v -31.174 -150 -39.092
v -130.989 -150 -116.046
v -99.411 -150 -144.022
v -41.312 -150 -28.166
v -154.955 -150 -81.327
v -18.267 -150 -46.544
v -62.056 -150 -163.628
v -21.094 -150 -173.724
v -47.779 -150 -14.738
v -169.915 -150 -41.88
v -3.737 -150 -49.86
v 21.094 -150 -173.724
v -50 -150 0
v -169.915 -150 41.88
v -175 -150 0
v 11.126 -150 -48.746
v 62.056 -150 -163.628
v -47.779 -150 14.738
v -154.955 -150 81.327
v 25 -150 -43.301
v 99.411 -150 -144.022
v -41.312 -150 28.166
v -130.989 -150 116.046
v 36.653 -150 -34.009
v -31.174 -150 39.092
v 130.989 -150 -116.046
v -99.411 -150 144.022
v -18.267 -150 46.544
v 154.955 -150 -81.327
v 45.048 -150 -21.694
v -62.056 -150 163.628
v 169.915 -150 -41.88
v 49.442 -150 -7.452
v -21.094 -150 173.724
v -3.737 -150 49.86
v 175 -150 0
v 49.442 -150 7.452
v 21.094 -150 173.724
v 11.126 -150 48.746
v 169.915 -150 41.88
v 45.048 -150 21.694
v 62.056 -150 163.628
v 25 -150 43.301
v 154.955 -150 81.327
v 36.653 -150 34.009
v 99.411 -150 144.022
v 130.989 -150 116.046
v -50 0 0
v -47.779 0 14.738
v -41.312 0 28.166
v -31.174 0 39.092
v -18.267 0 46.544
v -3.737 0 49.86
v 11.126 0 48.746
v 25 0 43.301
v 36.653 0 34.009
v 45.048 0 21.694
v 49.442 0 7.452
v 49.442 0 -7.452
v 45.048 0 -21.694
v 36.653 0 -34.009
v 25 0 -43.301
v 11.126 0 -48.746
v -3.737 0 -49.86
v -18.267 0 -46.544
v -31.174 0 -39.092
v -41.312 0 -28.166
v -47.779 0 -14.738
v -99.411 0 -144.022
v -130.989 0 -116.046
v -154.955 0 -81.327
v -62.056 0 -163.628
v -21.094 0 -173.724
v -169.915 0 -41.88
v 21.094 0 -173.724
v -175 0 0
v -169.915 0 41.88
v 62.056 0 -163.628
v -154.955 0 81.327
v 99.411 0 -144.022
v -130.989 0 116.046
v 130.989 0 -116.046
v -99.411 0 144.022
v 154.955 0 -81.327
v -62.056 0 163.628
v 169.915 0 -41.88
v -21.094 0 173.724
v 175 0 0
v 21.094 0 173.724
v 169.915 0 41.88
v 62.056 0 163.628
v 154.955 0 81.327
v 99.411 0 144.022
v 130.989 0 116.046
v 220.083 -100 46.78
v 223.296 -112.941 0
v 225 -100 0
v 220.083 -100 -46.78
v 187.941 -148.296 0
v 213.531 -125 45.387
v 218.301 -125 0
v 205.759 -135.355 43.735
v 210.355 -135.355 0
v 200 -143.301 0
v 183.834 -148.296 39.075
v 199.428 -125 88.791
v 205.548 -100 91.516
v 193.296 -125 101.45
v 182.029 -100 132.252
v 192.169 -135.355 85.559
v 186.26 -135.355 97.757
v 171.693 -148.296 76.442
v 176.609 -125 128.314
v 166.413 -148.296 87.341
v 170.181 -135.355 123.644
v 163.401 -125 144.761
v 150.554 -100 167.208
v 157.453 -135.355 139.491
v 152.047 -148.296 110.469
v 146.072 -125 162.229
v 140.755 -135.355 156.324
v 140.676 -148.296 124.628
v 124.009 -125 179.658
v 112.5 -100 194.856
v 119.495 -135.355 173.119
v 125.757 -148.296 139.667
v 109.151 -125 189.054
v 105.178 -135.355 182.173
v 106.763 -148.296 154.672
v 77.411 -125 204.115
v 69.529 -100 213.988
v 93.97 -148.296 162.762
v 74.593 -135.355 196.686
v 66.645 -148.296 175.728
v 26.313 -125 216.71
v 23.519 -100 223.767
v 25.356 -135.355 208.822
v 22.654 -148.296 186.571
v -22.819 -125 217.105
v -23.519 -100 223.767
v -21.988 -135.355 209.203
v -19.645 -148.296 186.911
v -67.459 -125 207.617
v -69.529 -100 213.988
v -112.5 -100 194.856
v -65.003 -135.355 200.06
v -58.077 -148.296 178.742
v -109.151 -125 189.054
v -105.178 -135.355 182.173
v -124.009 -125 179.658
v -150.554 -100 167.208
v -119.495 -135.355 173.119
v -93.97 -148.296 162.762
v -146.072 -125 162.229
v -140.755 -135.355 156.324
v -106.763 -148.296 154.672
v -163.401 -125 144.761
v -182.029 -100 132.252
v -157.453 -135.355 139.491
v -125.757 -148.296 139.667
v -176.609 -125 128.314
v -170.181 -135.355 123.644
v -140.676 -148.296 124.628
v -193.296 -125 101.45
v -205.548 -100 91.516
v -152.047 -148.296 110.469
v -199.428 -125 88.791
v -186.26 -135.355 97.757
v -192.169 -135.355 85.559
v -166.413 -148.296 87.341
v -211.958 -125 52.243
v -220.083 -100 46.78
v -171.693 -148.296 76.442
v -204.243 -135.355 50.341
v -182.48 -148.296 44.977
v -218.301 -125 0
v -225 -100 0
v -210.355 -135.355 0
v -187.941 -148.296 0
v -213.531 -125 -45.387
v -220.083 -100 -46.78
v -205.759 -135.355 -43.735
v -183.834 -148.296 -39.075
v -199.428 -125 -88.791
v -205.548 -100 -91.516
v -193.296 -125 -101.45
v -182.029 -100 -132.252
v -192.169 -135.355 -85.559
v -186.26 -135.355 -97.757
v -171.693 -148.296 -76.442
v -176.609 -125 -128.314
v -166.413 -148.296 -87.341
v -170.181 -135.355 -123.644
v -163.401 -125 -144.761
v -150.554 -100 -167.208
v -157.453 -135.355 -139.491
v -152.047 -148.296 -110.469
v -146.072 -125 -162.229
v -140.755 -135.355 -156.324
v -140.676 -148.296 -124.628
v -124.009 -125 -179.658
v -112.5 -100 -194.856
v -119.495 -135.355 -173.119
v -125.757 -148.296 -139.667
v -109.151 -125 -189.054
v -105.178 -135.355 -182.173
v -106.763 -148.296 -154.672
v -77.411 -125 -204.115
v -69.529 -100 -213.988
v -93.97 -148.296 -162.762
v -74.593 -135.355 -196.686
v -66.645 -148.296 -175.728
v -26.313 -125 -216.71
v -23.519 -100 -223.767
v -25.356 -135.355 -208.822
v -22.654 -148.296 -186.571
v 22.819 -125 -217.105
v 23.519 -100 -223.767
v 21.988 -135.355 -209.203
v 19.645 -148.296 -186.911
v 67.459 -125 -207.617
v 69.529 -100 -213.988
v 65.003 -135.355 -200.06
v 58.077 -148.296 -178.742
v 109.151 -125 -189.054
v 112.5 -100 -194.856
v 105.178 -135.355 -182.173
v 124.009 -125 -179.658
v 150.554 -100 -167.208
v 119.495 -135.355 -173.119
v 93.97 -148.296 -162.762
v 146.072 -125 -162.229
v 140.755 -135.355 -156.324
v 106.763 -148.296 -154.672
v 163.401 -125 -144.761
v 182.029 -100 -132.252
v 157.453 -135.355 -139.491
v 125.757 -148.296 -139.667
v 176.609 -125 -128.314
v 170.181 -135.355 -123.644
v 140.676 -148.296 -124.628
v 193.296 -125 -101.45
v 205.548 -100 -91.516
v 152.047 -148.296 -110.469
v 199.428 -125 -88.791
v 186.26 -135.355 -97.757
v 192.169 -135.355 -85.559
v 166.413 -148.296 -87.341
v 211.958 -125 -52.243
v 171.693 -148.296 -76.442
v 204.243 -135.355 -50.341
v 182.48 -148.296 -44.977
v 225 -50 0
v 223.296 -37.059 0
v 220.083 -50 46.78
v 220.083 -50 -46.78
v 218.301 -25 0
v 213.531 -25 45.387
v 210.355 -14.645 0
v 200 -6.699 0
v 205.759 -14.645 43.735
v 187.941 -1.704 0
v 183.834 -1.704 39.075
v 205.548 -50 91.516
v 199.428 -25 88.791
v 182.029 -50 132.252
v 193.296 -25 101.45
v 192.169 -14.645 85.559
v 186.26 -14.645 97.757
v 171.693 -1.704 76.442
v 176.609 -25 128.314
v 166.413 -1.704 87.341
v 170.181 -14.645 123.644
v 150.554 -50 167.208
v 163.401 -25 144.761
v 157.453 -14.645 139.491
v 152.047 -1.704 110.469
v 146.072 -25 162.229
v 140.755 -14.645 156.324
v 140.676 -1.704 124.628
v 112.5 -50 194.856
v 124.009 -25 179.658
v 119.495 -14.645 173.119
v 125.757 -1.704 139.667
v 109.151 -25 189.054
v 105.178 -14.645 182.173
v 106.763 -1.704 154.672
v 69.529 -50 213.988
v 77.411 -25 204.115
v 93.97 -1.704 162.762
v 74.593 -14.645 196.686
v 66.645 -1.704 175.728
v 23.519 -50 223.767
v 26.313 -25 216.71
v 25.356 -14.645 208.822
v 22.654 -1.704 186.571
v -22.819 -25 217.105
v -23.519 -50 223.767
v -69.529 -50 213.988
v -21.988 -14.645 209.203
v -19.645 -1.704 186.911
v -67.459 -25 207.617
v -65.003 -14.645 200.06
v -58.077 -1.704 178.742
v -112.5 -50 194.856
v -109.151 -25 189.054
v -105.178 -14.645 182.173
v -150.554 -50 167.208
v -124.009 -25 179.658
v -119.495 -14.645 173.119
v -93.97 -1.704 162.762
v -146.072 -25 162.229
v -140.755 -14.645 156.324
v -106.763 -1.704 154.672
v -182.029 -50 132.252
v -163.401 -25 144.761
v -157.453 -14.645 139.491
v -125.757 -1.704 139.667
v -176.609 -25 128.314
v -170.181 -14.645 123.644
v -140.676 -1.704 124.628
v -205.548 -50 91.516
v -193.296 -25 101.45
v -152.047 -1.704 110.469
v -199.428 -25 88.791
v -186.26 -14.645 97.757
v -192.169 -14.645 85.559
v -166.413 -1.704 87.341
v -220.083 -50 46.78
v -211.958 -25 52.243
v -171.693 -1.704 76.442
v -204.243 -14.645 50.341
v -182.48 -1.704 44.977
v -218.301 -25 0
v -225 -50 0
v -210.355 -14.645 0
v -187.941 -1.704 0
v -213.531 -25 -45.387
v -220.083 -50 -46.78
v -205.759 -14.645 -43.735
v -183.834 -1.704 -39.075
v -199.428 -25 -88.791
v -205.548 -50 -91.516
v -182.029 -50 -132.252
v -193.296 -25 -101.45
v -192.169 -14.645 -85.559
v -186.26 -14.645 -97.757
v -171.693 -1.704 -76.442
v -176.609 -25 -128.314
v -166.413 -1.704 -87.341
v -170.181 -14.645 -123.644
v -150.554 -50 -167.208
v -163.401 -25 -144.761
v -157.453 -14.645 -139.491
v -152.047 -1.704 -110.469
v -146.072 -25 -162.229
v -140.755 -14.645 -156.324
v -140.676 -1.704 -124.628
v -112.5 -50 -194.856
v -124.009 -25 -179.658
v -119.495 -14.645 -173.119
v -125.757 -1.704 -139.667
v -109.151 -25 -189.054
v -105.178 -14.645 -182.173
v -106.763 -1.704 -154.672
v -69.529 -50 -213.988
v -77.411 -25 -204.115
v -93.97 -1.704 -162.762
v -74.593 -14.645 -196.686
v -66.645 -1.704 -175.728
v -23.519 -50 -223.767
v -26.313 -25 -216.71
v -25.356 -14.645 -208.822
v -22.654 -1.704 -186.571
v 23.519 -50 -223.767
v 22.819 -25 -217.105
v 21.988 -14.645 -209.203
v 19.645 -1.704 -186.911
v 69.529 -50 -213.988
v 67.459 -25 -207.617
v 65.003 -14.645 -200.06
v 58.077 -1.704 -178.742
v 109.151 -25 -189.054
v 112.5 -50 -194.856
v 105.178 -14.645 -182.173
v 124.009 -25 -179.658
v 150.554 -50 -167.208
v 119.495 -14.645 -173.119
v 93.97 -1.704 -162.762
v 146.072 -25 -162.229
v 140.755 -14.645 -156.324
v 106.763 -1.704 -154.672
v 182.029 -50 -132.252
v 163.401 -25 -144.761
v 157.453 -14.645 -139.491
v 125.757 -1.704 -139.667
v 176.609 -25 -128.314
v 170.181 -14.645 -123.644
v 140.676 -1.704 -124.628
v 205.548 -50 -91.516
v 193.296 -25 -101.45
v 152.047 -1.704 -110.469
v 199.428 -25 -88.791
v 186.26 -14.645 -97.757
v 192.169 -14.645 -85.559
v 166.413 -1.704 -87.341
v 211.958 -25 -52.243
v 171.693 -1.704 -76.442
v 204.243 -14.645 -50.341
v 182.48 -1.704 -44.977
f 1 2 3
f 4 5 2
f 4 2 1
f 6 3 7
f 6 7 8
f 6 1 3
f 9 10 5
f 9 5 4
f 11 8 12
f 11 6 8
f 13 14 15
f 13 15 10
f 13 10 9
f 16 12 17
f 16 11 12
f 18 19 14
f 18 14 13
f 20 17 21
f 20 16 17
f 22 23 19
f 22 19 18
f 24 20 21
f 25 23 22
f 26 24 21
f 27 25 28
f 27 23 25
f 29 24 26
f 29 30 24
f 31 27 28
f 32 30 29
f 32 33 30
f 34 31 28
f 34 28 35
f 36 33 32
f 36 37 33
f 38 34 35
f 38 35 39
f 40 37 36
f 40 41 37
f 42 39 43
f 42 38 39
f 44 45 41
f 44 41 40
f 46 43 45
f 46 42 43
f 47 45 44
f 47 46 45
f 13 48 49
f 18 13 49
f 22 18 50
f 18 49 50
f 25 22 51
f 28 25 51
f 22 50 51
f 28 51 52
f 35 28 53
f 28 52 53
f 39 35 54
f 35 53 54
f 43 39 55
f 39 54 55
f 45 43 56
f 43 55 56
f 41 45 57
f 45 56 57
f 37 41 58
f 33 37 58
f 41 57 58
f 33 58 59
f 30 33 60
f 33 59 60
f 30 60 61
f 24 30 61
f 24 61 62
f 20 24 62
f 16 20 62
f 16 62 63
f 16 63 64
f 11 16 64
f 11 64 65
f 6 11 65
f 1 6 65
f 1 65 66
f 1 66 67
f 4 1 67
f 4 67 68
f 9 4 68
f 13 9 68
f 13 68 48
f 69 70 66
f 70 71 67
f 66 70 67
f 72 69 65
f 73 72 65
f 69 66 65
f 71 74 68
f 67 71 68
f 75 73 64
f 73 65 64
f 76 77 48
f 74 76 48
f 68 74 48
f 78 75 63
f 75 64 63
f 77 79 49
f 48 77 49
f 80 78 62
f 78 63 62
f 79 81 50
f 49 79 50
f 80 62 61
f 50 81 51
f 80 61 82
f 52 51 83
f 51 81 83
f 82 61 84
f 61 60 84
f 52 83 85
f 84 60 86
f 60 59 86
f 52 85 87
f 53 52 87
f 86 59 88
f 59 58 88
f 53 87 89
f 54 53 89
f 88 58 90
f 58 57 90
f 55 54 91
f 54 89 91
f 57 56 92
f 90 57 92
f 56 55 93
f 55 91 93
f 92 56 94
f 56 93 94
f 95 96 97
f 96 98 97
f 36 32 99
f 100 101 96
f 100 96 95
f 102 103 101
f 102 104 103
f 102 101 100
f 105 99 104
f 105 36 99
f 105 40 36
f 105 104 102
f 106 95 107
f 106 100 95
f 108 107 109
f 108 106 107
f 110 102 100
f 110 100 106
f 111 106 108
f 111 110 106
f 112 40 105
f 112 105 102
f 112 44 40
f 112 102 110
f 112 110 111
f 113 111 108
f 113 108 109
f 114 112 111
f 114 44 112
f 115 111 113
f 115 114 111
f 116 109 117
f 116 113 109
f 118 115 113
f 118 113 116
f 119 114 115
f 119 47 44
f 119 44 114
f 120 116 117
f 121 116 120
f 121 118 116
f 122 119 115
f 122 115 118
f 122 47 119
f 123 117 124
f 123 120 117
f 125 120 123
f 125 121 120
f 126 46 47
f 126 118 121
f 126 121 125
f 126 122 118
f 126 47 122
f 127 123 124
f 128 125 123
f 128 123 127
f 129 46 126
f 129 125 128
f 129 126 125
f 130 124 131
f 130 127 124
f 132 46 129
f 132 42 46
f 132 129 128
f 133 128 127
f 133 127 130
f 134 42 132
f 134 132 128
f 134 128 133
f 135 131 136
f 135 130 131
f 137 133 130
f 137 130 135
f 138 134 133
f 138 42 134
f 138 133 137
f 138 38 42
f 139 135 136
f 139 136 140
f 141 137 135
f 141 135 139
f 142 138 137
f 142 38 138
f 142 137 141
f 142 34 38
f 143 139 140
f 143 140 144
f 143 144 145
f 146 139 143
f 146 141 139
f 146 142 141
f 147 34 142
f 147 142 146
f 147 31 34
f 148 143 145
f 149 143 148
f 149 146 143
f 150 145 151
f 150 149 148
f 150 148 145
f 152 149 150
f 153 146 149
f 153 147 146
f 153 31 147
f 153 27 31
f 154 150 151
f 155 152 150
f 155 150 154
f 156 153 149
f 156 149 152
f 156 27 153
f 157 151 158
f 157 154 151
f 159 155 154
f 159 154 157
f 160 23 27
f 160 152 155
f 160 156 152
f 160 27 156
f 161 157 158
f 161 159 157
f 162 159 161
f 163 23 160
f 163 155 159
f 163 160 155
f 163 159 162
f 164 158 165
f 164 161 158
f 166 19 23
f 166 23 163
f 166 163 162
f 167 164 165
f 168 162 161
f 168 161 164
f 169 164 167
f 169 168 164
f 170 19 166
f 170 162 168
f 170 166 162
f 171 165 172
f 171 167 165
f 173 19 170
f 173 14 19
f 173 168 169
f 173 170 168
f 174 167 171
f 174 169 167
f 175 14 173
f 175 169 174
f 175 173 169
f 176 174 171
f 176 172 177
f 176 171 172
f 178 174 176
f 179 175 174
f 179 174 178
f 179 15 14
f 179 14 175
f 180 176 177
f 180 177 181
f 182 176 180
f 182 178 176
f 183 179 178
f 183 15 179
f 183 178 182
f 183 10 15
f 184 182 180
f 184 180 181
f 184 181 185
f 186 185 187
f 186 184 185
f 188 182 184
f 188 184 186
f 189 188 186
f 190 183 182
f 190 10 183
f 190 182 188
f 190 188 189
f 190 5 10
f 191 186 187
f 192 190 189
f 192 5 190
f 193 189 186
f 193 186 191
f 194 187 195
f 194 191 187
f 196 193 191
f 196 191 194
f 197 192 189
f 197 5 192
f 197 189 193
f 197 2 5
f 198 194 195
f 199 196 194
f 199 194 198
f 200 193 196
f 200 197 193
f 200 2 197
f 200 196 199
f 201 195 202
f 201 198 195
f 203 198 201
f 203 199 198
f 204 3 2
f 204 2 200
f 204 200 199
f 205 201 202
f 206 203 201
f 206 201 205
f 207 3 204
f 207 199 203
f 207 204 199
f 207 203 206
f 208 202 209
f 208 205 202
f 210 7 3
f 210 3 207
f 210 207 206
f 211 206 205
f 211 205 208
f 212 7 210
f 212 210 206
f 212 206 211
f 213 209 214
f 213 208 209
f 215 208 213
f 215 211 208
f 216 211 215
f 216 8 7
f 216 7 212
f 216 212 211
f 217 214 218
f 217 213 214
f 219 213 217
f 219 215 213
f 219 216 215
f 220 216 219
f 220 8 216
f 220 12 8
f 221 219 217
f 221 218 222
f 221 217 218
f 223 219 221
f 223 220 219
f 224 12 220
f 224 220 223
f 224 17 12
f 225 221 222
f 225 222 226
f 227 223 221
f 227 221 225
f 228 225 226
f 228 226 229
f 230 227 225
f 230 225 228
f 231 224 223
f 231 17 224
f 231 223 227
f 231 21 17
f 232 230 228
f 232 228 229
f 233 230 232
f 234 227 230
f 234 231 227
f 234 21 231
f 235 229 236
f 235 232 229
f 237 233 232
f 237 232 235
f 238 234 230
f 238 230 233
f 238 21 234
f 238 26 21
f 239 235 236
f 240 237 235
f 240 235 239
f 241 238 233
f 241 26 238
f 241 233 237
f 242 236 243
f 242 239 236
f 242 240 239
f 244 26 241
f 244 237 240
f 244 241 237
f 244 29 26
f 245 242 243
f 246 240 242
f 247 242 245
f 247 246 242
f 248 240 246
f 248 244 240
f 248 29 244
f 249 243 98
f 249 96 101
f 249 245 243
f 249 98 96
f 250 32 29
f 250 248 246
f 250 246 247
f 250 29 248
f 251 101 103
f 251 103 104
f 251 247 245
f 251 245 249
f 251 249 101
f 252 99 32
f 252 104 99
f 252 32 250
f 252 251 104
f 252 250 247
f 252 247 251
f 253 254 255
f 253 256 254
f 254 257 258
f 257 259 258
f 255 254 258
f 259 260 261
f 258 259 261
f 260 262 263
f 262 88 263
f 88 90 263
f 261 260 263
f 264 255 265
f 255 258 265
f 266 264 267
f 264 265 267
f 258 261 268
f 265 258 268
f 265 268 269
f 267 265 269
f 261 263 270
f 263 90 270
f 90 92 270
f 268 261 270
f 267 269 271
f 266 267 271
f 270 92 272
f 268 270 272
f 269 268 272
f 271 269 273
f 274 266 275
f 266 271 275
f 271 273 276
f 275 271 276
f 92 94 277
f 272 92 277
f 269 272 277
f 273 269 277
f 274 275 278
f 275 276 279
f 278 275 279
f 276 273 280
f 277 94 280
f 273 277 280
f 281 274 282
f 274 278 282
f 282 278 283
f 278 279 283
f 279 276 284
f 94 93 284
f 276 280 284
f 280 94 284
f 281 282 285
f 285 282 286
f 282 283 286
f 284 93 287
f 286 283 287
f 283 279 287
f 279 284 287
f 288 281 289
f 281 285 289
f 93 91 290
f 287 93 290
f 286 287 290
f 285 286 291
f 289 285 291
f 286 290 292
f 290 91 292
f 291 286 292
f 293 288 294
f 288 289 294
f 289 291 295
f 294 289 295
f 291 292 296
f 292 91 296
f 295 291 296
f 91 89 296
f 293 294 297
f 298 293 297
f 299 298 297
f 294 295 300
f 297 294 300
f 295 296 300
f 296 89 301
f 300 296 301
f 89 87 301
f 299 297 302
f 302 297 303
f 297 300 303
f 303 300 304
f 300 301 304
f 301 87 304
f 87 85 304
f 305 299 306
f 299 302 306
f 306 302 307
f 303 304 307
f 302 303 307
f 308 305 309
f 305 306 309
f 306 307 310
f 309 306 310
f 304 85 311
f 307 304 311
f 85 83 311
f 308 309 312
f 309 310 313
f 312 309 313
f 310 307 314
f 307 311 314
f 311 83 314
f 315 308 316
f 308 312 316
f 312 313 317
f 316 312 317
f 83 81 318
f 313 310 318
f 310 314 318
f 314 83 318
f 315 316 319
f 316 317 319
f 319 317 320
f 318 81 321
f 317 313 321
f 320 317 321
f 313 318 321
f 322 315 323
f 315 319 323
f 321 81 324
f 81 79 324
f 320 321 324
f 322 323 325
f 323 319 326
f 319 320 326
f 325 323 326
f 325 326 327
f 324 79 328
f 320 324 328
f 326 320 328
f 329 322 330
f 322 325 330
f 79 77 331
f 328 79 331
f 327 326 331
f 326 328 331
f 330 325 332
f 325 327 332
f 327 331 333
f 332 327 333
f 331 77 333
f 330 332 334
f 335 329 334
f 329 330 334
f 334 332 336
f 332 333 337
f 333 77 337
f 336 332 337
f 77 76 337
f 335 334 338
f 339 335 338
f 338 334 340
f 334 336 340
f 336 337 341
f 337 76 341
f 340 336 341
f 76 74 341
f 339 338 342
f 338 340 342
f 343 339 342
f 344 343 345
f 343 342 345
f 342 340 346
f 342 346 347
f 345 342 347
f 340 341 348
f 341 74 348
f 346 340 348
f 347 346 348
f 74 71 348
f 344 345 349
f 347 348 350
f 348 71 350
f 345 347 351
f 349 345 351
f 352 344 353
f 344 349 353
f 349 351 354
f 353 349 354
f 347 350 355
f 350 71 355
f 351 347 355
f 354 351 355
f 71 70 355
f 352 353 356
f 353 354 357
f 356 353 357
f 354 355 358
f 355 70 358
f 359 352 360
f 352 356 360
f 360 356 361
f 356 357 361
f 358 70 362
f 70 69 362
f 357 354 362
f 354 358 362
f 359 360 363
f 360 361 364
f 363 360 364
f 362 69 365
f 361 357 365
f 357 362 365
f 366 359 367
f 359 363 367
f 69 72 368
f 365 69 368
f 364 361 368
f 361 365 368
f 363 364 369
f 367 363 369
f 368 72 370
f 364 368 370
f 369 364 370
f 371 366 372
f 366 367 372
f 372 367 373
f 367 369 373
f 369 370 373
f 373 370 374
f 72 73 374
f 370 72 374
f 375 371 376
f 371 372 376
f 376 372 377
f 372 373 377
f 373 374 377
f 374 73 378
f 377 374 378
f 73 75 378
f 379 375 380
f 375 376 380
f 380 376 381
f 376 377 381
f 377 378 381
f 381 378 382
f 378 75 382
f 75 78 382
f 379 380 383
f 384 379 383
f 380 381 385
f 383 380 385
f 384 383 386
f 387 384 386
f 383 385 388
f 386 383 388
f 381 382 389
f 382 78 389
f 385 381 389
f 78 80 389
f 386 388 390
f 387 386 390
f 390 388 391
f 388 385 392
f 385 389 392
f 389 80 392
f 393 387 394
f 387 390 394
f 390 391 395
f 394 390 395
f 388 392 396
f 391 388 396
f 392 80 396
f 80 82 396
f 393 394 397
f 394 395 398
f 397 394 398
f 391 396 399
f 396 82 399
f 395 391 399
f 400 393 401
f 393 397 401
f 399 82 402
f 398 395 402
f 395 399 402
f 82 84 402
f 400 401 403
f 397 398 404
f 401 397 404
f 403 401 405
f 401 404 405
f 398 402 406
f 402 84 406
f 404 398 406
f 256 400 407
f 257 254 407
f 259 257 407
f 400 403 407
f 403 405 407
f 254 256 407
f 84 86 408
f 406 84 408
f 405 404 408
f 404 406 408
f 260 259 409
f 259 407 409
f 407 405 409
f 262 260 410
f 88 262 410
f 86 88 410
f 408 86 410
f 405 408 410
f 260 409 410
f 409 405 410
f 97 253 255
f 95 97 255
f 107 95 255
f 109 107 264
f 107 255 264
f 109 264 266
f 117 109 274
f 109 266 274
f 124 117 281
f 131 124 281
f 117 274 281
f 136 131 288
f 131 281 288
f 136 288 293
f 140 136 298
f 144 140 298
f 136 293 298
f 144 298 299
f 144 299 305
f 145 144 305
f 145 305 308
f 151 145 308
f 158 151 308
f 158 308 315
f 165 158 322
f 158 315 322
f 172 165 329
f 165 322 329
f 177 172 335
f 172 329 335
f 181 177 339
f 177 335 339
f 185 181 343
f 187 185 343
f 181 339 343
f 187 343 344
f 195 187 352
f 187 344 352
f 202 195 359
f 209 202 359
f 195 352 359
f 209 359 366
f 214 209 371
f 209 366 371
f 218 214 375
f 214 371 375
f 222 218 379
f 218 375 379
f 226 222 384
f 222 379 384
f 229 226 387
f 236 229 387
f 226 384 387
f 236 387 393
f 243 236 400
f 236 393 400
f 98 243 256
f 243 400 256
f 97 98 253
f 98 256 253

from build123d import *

# Parameters (mm, degrees)
F0_R     = 225
F1_DEPTH = 150
F2_R     = 50
F4_D     = 100


with BuildPart() as f1:
    # F0 (on Front) → F1 (new body)
    with BuildSketch(Plane.XZ):
        Circle(F0_R)
    extrude(amount=F1_DEPTH)

    # F2
    f2_edges = [f1.edges().sort_by_distance(p)[0] for p in [
        (-225, -150, 0),
        (-225, 0, 0),
    ]]
    fillet(f2_edges, radius=F2_R)

    # F4 (through all)
    with Locations(Plane.XZ.offset(150)):
        with Locations((0, 0)):
            Hole(F4_D / 2)


solid = f1.part
